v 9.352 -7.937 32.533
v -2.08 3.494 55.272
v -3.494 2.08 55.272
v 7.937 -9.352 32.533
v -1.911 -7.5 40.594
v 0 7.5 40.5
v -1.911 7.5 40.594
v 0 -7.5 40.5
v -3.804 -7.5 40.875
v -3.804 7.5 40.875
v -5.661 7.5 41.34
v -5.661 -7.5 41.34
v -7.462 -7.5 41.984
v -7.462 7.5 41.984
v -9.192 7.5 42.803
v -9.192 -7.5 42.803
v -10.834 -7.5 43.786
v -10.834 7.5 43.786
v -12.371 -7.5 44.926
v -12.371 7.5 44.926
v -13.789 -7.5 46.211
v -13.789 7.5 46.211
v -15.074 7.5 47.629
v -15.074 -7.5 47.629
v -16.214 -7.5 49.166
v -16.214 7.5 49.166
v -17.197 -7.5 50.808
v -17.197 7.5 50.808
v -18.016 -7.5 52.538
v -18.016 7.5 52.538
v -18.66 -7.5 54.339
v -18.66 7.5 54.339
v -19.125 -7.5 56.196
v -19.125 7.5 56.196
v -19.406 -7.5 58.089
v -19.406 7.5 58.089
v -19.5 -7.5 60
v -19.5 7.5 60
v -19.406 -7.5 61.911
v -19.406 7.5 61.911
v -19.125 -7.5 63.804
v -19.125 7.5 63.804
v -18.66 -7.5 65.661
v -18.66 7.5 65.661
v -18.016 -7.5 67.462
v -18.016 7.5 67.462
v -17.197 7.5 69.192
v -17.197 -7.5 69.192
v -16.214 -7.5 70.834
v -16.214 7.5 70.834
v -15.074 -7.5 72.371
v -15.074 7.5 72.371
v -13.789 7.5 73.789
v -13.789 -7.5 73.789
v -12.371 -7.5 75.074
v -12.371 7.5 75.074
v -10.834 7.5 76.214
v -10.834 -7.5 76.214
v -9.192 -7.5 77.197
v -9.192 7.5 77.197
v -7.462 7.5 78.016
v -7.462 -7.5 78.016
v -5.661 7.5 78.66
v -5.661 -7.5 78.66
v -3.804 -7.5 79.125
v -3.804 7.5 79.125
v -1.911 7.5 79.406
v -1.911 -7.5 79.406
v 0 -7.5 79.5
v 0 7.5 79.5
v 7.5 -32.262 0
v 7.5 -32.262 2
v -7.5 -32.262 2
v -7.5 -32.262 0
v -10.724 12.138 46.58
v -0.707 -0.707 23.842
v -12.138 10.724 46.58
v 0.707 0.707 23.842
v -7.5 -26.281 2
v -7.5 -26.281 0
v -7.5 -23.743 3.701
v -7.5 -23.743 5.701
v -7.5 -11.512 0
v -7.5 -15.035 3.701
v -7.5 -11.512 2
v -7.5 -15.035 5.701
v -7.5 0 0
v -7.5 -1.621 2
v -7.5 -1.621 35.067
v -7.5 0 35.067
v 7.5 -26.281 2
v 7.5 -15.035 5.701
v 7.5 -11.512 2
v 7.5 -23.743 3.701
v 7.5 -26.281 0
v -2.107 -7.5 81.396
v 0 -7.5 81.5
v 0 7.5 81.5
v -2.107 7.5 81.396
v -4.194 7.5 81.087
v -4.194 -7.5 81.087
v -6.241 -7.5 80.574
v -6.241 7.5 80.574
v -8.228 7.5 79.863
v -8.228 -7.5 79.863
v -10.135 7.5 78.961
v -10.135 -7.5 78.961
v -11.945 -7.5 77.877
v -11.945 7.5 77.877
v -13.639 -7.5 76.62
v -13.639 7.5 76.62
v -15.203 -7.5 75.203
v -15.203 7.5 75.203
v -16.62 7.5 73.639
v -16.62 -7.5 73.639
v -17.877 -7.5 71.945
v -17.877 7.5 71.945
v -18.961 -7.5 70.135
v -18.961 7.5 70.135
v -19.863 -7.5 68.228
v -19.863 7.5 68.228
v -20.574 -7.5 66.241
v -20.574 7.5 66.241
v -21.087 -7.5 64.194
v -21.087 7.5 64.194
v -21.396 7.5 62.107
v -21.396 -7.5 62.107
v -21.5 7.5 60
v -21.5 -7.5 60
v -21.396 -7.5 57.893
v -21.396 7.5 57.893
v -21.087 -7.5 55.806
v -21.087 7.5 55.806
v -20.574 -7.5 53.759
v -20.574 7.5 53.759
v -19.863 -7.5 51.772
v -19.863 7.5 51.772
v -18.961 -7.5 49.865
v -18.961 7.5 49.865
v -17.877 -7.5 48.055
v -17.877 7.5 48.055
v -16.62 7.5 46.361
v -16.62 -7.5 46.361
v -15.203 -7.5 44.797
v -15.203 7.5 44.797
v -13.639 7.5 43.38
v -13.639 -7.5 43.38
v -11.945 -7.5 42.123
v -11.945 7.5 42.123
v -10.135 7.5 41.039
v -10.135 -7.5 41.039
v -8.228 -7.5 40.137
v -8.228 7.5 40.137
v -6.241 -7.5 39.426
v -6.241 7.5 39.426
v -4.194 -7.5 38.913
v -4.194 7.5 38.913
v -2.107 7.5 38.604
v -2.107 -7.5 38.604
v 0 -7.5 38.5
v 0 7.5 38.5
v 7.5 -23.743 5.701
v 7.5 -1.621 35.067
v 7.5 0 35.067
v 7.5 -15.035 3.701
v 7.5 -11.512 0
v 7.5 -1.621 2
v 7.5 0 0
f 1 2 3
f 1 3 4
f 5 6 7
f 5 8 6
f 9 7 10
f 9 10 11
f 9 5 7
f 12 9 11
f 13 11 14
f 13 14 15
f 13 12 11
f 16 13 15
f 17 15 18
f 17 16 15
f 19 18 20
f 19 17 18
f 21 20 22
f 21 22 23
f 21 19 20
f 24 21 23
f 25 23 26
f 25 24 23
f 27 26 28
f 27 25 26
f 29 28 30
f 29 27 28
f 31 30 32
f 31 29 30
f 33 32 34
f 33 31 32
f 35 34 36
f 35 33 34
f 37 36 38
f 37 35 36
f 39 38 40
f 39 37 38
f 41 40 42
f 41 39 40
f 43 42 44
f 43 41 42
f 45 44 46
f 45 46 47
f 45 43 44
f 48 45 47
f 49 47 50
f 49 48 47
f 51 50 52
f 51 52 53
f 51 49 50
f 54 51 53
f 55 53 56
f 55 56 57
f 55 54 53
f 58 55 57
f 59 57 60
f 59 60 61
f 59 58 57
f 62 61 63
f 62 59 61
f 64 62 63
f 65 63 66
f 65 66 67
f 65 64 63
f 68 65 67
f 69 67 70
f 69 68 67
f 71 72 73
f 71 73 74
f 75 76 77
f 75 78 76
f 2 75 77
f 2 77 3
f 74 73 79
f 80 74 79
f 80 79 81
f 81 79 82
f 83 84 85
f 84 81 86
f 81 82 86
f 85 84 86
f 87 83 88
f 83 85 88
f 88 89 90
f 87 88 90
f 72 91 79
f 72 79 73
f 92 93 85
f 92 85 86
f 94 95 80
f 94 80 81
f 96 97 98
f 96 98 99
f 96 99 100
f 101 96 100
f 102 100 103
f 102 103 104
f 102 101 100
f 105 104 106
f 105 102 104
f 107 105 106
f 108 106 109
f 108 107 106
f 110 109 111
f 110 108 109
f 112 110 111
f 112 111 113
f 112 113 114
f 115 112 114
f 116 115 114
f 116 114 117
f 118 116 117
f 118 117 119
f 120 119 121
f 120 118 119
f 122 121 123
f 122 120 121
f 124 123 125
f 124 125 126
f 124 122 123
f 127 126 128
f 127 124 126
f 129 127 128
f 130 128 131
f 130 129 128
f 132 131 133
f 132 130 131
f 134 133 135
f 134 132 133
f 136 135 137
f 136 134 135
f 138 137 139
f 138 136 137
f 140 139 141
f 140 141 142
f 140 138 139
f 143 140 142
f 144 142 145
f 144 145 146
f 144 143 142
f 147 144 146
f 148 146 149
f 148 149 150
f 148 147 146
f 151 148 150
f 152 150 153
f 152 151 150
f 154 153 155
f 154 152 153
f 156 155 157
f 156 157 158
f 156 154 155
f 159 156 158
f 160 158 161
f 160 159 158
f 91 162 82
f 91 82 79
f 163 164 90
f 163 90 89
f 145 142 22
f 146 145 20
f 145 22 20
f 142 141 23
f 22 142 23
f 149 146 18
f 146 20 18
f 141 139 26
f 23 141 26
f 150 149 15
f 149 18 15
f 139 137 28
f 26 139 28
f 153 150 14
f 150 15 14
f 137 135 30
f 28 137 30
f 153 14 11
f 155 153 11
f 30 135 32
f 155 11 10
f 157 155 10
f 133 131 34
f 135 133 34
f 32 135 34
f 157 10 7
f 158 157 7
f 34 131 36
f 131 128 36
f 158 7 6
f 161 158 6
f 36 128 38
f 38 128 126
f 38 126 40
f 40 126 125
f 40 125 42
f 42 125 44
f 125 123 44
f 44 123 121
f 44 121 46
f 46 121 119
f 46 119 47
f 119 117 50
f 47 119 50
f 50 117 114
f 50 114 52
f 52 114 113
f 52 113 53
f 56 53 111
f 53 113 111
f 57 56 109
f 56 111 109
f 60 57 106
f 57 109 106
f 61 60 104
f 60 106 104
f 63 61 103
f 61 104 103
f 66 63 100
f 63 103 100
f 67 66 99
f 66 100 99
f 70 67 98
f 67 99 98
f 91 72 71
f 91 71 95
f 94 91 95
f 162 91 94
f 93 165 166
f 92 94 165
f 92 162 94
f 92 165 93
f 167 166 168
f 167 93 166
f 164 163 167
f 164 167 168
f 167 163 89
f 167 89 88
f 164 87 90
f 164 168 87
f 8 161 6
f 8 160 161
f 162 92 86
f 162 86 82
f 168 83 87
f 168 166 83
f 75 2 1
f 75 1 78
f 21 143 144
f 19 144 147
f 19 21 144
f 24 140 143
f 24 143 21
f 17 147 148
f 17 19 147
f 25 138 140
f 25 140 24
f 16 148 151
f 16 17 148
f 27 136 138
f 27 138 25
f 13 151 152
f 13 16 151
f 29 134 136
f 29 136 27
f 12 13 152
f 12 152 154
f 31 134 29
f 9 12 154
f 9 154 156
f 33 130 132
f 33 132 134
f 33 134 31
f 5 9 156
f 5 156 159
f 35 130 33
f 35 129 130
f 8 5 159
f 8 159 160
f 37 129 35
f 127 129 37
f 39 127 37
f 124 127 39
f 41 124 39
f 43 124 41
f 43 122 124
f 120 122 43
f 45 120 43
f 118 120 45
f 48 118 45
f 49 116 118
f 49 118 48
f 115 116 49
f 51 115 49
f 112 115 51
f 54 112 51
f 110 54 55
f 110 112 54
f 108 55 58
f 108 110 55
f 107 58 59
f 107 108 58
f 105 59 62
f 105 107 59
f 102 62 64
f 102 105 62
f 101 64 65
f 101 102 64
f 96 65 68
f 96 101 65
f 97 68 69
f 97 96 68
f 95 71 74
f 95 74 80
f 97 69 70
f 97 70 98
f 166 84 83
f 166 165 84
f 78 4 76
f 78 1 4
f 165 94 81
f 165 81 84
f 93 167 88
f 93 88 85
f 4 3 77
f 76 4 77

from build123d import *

# Parameters (mm, degrees)
F1_DEPTH = 7.5
F3_DEPTH = 7.5
F6_DEPTH = 1


with BuildPart() as f1:
    # F0 (on Front) → F1 (new body, symmetric)
    with BuildSketch(Plane.XZ):
        with BuildLine():
            ThreePointArc((0, 40.5), (-19.5, 60), (0, 79.5))
            Line((0, 79.5), (0, 81.5))
            ThreePointArc((0, 81.5), (-21.5, 60), (0, 38.5))
            Line((0, 38.5), (0, 40.5))
        make_face()
    extrude(amount=F1_DEPTH, both=True)


with BuildPart() as f3:
    # F2 (on Right) → F3 (new body, symmetric)
    with BuildSketch(Plane.YZ):
        Polygon((0, 0), (0, 35.0671593758), (-1.6212782684, 35.0671593758), (-1.6212782684, 2), (-11.51165483, 2), (-15.0352595659, 5.7006245105), (-23.7427725853, 5.7006245105), (-26.2806854154, 2), (-32.2620575655, 2), (-32.2620575655, 0), (-26.2806854154, 0), (-23.7427725853, 3.7006245105), (-15.0352595659, 3.7006245105), (-11.51165483, 0), align=None)
    extrude(amount=F3_DEPTH, both=True)


with BuildPart() as f6:
    # F5 (on face) → F6 (new body, symmetric)
    with BuildSketch(Plane(origin=(0, 0, 0), x_dir=(-0.7071067812, 0.7071067812, 0), z_dir=(0.7071067812, 0.7071067812, 0))):
        Polygon((0, 23.8415779416), (16.166330901, 46.5799224766), (3.9411990612, 55.2716513897), (-12.2251318398, 32.5333068548), align=None)
    extrude(amount=F6_DEPTH, both=True)


solid = Compound([f1.part, f3.part, f6.part])
